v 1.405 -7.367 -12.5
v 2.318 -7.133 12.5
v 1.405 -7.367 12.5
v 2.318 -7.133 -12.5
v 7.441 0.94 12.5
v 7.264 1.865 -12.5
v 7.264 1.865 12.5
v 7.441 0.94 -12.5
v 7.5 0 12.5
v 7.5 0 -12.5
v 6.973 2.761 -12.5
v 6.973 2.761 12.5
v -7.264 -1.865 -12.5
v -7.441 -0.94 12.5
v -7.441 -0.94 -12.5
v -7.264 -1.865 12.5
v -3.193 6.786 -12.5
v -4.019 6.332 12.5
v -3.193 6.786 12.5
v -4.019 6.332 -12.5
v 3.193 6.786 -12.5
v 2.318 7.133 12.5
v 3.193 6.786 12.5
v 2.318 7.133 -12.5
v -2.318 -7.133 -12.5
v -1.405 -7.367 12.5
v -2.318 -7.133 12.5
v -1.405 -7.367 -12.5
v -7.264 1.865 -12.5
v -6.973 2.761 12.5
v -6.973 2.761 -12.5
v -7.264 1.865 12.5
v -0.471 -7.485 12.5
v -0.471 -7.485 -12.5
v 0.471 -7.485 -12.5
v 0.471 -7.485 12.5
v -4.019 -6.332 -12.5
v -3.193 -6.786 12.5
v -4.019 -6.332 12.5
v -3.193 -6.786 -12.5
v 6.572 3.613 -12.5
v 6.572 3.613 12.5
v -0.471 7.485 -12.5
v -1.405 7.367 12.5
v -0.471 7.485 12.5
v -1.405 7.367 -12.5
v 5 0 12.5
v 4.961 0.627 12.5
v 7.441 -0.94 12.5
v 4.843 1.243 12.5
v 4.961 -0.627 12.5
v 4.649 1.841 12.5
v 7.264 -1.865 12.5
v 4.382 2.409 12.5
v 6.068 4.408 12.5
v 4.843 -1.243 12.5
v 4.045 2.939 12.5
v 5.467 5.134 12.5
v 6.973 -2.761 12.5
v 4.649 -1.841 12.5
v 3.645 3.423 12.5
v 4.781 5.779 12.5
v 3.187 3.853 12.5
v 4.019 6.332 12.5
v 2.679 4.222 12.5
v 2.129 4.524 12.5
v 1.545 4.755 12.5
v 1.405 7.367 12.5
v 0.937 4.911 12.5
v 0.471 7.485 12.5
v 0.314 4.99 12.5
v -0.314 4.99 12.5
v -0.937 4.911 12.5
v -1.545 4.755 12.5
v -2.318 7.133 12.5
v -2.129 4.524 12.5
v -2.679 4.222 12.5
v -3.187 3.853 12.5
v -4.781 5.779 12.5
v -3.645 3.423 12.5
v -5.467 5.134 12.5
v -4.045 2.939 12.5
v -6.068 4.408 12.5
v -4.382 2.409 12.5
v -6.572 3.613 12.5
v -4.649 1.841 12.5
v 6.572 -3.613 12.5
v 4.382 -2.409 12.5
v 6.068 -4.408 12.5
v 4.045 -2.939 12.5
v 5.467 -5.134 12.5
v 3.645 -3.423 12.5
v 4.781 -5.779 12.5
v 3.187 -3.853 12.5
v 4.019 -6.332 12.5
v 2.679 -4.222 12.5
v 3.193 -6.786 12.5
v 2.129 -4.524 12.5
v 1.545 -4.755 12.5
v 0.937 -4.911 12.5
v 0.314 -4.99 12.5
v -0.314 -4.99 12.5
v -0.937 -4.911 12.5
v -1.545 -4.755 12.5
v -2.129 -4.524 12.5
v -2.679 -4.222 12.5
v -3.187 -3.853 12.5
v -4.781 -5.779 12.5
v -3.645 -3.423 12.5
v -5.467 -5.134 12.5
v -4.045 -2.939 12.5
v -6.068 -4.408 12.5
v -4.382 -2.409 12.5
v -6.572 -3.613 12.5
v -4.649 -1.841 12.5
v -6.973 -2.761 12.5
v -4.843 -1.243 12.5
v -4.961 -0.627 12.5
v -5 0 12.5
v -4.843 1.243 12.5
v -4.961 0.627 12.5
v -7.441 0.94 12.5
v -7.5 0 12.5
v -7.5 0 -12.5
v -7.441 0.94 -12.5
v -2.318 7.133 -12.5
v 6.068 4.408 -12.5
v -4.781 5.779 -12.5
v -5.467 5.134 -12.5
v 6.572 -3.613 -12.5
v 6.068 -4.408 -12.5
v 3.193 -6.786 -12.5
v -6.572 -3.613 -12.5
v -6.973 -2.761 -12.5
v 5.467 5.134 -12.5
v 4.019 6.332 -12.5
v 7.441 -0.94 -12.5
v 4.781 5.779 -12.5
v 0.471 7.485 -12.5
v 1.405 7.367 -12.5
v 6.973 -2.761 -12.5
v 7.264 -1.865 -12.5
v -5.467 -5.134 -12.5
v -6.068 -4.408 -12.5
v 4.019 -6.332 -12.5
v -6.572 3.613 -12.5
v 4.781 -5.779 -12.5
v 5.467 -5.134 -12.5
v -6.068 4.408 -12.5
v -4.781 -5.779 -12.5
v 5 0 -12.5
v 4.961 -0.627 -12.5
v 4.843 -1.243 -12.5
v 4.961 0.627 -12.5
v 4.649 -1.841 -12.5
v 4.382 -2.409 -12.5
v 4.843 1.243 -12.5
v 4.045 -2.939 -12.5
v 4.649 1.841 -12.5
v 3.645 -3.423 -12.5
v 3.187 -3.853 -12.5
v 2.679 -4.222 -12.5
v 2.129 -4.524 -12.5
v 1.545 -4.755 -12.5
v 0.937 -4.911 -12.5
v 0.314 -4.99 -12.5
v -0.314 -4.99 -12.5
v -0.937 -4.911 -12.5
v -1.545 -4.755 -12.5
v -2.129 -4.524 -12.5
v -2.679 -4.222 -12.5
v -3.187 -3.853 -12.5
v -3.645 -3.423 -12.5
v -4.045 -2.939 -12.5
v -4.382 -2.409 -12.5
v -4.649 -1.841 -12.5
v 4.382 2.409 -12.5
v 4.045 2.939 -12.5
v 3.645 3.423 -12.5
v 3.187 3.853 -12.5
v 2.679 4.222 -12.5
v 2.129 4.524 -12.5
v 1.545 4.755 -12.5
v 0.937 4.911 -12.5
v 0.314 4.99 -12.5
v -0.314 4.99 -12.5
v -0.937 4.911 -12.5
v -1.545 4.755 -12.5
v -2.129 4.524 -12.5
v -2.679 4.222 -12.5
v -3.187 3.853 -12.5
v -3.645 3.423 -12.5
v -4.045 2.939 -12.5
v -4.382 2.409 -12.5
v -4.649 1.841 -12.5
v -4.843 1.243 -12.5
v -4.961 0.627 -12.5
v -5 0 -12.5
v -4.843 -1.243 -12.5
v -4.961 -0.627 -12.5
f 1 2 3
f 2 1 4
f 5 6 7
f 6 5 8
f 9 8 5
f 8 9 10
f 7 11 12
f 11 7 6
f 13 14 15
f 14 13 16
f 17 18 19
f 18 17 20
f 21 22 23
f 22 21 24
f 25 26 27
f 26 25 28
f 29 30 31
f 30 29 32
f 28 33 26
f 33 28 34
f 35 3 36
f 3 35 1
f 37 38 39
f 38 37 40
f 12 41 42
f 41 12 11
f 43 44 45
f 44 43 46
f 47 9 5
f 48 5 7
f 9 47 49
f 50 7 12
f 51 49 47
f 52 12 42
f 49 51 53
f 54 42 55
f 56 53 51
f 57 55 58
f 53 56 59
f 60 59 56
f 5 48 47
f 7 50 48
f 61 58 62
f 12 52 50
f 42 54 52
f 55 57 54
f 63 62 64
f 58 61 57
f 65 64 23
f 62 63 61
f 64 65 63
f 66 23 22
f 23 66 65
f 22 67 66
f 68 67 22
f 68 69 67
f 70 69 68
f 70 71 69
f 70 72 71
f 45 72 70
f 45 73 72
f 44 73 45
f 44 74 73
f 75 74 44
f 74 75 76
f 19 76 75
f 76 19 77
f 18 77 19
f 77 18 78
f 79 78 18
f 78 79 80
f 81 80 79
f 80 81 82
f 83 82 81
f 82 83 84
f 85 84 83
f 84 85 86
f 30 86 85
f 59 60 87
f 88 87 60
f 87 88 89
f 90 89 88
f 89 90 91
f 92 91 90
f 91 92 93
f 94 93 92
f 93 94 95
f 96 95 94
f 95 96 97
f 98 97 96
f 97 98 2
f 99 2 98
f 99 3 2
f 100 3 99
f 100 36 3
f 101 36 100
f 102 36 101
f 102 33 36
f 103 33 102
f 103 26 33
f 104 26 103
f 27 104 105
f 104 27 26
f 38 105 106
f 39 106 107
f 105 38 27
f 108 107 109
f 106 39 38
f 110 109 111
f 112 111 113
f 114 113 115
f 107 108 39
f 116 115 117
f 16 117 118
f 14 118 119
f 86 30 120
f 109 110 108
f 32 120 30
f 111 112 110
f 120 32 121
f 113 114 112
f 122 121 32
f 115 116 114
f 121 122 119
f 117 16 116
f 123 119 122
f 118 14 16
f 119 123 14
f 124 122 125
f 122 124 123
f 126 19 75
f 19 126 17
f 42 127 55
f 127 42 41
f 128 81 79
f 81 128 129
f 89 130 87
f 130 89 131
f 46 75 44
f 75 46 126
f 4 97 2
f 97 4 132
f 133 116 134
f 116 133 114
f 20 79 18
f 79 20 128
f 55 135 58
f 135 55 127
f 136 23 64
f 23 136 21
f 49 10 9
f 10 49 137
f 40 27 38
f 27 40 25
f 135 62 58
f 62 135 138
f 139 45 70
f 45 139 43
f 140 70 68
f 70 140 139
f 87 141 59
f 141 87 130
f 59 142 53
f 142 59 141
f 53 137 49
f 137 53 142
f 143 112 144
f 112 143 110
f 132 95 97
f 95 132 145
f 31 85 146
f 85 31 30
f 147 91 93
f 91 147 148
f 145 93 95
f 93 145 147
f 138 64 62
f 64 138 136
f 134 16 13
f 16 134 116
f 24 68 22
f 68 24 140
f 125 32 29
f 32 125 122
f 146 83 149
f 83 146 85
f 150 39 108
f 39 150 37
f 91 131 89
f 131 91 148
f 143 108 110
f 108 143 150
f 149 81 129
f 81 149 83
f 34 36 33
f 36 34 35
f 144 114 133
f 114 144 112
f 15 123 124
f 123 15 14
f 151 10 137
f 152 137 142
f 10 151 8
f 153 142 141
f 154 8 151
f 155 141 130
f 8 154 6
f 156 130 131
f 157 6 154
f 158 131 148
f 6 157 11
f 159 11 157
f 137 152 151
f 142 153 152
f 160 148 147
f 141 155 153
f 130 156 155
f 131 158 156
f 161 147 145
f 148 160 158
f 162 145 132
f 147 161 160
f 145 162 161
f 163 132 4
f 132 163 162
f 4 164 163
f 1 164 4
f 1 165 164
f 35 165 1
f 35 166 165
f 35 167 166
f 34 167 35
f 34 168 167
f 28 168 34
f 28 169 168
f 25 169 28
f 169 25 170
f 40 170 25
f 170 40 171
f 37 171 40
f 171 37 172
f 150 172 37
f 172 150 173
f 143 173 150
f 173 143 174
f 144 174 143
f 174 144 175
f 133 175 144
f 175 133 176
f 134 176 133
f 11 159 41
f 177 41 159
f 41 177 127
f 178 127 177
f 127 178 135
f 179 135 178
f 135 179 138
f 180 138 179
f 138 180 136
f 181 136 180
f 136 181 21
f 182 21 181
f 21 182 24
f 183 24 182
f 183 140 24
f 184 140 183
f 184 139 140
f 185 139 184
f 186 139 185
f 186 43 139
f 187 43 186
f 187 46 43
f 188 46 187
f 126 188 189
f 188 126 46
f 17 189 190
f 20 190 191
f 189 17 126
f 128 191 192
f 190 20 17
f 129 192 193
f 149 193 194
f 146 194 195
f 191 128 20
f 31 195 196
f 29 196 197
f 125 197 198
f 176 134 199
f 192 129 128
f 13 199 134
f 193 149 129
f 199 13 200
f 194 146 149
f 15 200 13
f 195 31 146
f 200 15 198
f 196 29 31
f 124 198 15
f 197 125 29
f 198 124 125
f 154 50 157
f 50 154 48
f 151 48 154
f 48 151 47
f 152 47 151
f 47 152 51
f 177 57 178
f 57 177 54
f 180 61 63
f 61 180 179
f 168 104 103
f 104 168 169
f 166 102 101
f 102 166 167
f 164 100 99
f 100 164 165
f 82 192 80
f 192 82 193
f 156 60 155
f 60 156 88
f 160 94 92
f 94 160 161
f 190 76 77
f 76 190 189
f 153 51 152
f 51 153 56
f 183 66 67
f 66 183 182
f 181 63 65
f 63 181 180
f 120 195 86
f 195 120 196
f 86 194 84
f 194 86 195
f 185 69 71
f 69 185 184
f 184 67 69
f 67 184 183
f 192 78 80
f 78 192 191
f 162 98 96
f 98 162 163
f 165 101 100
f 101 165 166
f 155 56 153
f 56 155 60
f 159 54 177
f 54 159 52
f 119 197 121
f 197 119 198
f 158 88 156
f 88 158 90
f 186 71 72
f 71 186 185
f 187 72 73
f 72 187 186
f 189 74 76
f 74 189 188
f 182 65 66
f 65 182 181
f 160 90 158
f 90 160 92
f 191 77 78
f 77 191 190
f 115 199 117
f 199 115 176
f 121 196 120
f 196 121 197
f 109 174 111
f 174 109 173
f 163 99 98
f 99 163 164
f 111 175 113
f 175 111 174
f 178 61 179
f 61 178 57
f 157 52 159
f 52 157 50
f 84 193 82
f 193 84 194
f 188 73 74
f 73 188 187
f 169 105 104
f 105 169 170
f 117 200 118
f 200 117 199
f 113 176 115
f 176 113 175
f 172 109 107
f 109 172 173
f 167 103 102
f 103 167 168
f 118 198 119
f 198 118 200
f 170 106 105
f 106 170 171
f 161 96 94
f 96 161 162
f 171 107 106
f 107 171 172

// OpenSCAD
$fn = 50;


difference() {
	union() {
		translate(v = [0, 0, -12.5000000000]) {
			cylinder(h = 25, r = 7.5000000000);
		}
	}
	union() {
		translate(v = [0, 0, -100.0000000000]) {
			cylinder(h = 200, r = 5.0000000000);
		}
	}
}
